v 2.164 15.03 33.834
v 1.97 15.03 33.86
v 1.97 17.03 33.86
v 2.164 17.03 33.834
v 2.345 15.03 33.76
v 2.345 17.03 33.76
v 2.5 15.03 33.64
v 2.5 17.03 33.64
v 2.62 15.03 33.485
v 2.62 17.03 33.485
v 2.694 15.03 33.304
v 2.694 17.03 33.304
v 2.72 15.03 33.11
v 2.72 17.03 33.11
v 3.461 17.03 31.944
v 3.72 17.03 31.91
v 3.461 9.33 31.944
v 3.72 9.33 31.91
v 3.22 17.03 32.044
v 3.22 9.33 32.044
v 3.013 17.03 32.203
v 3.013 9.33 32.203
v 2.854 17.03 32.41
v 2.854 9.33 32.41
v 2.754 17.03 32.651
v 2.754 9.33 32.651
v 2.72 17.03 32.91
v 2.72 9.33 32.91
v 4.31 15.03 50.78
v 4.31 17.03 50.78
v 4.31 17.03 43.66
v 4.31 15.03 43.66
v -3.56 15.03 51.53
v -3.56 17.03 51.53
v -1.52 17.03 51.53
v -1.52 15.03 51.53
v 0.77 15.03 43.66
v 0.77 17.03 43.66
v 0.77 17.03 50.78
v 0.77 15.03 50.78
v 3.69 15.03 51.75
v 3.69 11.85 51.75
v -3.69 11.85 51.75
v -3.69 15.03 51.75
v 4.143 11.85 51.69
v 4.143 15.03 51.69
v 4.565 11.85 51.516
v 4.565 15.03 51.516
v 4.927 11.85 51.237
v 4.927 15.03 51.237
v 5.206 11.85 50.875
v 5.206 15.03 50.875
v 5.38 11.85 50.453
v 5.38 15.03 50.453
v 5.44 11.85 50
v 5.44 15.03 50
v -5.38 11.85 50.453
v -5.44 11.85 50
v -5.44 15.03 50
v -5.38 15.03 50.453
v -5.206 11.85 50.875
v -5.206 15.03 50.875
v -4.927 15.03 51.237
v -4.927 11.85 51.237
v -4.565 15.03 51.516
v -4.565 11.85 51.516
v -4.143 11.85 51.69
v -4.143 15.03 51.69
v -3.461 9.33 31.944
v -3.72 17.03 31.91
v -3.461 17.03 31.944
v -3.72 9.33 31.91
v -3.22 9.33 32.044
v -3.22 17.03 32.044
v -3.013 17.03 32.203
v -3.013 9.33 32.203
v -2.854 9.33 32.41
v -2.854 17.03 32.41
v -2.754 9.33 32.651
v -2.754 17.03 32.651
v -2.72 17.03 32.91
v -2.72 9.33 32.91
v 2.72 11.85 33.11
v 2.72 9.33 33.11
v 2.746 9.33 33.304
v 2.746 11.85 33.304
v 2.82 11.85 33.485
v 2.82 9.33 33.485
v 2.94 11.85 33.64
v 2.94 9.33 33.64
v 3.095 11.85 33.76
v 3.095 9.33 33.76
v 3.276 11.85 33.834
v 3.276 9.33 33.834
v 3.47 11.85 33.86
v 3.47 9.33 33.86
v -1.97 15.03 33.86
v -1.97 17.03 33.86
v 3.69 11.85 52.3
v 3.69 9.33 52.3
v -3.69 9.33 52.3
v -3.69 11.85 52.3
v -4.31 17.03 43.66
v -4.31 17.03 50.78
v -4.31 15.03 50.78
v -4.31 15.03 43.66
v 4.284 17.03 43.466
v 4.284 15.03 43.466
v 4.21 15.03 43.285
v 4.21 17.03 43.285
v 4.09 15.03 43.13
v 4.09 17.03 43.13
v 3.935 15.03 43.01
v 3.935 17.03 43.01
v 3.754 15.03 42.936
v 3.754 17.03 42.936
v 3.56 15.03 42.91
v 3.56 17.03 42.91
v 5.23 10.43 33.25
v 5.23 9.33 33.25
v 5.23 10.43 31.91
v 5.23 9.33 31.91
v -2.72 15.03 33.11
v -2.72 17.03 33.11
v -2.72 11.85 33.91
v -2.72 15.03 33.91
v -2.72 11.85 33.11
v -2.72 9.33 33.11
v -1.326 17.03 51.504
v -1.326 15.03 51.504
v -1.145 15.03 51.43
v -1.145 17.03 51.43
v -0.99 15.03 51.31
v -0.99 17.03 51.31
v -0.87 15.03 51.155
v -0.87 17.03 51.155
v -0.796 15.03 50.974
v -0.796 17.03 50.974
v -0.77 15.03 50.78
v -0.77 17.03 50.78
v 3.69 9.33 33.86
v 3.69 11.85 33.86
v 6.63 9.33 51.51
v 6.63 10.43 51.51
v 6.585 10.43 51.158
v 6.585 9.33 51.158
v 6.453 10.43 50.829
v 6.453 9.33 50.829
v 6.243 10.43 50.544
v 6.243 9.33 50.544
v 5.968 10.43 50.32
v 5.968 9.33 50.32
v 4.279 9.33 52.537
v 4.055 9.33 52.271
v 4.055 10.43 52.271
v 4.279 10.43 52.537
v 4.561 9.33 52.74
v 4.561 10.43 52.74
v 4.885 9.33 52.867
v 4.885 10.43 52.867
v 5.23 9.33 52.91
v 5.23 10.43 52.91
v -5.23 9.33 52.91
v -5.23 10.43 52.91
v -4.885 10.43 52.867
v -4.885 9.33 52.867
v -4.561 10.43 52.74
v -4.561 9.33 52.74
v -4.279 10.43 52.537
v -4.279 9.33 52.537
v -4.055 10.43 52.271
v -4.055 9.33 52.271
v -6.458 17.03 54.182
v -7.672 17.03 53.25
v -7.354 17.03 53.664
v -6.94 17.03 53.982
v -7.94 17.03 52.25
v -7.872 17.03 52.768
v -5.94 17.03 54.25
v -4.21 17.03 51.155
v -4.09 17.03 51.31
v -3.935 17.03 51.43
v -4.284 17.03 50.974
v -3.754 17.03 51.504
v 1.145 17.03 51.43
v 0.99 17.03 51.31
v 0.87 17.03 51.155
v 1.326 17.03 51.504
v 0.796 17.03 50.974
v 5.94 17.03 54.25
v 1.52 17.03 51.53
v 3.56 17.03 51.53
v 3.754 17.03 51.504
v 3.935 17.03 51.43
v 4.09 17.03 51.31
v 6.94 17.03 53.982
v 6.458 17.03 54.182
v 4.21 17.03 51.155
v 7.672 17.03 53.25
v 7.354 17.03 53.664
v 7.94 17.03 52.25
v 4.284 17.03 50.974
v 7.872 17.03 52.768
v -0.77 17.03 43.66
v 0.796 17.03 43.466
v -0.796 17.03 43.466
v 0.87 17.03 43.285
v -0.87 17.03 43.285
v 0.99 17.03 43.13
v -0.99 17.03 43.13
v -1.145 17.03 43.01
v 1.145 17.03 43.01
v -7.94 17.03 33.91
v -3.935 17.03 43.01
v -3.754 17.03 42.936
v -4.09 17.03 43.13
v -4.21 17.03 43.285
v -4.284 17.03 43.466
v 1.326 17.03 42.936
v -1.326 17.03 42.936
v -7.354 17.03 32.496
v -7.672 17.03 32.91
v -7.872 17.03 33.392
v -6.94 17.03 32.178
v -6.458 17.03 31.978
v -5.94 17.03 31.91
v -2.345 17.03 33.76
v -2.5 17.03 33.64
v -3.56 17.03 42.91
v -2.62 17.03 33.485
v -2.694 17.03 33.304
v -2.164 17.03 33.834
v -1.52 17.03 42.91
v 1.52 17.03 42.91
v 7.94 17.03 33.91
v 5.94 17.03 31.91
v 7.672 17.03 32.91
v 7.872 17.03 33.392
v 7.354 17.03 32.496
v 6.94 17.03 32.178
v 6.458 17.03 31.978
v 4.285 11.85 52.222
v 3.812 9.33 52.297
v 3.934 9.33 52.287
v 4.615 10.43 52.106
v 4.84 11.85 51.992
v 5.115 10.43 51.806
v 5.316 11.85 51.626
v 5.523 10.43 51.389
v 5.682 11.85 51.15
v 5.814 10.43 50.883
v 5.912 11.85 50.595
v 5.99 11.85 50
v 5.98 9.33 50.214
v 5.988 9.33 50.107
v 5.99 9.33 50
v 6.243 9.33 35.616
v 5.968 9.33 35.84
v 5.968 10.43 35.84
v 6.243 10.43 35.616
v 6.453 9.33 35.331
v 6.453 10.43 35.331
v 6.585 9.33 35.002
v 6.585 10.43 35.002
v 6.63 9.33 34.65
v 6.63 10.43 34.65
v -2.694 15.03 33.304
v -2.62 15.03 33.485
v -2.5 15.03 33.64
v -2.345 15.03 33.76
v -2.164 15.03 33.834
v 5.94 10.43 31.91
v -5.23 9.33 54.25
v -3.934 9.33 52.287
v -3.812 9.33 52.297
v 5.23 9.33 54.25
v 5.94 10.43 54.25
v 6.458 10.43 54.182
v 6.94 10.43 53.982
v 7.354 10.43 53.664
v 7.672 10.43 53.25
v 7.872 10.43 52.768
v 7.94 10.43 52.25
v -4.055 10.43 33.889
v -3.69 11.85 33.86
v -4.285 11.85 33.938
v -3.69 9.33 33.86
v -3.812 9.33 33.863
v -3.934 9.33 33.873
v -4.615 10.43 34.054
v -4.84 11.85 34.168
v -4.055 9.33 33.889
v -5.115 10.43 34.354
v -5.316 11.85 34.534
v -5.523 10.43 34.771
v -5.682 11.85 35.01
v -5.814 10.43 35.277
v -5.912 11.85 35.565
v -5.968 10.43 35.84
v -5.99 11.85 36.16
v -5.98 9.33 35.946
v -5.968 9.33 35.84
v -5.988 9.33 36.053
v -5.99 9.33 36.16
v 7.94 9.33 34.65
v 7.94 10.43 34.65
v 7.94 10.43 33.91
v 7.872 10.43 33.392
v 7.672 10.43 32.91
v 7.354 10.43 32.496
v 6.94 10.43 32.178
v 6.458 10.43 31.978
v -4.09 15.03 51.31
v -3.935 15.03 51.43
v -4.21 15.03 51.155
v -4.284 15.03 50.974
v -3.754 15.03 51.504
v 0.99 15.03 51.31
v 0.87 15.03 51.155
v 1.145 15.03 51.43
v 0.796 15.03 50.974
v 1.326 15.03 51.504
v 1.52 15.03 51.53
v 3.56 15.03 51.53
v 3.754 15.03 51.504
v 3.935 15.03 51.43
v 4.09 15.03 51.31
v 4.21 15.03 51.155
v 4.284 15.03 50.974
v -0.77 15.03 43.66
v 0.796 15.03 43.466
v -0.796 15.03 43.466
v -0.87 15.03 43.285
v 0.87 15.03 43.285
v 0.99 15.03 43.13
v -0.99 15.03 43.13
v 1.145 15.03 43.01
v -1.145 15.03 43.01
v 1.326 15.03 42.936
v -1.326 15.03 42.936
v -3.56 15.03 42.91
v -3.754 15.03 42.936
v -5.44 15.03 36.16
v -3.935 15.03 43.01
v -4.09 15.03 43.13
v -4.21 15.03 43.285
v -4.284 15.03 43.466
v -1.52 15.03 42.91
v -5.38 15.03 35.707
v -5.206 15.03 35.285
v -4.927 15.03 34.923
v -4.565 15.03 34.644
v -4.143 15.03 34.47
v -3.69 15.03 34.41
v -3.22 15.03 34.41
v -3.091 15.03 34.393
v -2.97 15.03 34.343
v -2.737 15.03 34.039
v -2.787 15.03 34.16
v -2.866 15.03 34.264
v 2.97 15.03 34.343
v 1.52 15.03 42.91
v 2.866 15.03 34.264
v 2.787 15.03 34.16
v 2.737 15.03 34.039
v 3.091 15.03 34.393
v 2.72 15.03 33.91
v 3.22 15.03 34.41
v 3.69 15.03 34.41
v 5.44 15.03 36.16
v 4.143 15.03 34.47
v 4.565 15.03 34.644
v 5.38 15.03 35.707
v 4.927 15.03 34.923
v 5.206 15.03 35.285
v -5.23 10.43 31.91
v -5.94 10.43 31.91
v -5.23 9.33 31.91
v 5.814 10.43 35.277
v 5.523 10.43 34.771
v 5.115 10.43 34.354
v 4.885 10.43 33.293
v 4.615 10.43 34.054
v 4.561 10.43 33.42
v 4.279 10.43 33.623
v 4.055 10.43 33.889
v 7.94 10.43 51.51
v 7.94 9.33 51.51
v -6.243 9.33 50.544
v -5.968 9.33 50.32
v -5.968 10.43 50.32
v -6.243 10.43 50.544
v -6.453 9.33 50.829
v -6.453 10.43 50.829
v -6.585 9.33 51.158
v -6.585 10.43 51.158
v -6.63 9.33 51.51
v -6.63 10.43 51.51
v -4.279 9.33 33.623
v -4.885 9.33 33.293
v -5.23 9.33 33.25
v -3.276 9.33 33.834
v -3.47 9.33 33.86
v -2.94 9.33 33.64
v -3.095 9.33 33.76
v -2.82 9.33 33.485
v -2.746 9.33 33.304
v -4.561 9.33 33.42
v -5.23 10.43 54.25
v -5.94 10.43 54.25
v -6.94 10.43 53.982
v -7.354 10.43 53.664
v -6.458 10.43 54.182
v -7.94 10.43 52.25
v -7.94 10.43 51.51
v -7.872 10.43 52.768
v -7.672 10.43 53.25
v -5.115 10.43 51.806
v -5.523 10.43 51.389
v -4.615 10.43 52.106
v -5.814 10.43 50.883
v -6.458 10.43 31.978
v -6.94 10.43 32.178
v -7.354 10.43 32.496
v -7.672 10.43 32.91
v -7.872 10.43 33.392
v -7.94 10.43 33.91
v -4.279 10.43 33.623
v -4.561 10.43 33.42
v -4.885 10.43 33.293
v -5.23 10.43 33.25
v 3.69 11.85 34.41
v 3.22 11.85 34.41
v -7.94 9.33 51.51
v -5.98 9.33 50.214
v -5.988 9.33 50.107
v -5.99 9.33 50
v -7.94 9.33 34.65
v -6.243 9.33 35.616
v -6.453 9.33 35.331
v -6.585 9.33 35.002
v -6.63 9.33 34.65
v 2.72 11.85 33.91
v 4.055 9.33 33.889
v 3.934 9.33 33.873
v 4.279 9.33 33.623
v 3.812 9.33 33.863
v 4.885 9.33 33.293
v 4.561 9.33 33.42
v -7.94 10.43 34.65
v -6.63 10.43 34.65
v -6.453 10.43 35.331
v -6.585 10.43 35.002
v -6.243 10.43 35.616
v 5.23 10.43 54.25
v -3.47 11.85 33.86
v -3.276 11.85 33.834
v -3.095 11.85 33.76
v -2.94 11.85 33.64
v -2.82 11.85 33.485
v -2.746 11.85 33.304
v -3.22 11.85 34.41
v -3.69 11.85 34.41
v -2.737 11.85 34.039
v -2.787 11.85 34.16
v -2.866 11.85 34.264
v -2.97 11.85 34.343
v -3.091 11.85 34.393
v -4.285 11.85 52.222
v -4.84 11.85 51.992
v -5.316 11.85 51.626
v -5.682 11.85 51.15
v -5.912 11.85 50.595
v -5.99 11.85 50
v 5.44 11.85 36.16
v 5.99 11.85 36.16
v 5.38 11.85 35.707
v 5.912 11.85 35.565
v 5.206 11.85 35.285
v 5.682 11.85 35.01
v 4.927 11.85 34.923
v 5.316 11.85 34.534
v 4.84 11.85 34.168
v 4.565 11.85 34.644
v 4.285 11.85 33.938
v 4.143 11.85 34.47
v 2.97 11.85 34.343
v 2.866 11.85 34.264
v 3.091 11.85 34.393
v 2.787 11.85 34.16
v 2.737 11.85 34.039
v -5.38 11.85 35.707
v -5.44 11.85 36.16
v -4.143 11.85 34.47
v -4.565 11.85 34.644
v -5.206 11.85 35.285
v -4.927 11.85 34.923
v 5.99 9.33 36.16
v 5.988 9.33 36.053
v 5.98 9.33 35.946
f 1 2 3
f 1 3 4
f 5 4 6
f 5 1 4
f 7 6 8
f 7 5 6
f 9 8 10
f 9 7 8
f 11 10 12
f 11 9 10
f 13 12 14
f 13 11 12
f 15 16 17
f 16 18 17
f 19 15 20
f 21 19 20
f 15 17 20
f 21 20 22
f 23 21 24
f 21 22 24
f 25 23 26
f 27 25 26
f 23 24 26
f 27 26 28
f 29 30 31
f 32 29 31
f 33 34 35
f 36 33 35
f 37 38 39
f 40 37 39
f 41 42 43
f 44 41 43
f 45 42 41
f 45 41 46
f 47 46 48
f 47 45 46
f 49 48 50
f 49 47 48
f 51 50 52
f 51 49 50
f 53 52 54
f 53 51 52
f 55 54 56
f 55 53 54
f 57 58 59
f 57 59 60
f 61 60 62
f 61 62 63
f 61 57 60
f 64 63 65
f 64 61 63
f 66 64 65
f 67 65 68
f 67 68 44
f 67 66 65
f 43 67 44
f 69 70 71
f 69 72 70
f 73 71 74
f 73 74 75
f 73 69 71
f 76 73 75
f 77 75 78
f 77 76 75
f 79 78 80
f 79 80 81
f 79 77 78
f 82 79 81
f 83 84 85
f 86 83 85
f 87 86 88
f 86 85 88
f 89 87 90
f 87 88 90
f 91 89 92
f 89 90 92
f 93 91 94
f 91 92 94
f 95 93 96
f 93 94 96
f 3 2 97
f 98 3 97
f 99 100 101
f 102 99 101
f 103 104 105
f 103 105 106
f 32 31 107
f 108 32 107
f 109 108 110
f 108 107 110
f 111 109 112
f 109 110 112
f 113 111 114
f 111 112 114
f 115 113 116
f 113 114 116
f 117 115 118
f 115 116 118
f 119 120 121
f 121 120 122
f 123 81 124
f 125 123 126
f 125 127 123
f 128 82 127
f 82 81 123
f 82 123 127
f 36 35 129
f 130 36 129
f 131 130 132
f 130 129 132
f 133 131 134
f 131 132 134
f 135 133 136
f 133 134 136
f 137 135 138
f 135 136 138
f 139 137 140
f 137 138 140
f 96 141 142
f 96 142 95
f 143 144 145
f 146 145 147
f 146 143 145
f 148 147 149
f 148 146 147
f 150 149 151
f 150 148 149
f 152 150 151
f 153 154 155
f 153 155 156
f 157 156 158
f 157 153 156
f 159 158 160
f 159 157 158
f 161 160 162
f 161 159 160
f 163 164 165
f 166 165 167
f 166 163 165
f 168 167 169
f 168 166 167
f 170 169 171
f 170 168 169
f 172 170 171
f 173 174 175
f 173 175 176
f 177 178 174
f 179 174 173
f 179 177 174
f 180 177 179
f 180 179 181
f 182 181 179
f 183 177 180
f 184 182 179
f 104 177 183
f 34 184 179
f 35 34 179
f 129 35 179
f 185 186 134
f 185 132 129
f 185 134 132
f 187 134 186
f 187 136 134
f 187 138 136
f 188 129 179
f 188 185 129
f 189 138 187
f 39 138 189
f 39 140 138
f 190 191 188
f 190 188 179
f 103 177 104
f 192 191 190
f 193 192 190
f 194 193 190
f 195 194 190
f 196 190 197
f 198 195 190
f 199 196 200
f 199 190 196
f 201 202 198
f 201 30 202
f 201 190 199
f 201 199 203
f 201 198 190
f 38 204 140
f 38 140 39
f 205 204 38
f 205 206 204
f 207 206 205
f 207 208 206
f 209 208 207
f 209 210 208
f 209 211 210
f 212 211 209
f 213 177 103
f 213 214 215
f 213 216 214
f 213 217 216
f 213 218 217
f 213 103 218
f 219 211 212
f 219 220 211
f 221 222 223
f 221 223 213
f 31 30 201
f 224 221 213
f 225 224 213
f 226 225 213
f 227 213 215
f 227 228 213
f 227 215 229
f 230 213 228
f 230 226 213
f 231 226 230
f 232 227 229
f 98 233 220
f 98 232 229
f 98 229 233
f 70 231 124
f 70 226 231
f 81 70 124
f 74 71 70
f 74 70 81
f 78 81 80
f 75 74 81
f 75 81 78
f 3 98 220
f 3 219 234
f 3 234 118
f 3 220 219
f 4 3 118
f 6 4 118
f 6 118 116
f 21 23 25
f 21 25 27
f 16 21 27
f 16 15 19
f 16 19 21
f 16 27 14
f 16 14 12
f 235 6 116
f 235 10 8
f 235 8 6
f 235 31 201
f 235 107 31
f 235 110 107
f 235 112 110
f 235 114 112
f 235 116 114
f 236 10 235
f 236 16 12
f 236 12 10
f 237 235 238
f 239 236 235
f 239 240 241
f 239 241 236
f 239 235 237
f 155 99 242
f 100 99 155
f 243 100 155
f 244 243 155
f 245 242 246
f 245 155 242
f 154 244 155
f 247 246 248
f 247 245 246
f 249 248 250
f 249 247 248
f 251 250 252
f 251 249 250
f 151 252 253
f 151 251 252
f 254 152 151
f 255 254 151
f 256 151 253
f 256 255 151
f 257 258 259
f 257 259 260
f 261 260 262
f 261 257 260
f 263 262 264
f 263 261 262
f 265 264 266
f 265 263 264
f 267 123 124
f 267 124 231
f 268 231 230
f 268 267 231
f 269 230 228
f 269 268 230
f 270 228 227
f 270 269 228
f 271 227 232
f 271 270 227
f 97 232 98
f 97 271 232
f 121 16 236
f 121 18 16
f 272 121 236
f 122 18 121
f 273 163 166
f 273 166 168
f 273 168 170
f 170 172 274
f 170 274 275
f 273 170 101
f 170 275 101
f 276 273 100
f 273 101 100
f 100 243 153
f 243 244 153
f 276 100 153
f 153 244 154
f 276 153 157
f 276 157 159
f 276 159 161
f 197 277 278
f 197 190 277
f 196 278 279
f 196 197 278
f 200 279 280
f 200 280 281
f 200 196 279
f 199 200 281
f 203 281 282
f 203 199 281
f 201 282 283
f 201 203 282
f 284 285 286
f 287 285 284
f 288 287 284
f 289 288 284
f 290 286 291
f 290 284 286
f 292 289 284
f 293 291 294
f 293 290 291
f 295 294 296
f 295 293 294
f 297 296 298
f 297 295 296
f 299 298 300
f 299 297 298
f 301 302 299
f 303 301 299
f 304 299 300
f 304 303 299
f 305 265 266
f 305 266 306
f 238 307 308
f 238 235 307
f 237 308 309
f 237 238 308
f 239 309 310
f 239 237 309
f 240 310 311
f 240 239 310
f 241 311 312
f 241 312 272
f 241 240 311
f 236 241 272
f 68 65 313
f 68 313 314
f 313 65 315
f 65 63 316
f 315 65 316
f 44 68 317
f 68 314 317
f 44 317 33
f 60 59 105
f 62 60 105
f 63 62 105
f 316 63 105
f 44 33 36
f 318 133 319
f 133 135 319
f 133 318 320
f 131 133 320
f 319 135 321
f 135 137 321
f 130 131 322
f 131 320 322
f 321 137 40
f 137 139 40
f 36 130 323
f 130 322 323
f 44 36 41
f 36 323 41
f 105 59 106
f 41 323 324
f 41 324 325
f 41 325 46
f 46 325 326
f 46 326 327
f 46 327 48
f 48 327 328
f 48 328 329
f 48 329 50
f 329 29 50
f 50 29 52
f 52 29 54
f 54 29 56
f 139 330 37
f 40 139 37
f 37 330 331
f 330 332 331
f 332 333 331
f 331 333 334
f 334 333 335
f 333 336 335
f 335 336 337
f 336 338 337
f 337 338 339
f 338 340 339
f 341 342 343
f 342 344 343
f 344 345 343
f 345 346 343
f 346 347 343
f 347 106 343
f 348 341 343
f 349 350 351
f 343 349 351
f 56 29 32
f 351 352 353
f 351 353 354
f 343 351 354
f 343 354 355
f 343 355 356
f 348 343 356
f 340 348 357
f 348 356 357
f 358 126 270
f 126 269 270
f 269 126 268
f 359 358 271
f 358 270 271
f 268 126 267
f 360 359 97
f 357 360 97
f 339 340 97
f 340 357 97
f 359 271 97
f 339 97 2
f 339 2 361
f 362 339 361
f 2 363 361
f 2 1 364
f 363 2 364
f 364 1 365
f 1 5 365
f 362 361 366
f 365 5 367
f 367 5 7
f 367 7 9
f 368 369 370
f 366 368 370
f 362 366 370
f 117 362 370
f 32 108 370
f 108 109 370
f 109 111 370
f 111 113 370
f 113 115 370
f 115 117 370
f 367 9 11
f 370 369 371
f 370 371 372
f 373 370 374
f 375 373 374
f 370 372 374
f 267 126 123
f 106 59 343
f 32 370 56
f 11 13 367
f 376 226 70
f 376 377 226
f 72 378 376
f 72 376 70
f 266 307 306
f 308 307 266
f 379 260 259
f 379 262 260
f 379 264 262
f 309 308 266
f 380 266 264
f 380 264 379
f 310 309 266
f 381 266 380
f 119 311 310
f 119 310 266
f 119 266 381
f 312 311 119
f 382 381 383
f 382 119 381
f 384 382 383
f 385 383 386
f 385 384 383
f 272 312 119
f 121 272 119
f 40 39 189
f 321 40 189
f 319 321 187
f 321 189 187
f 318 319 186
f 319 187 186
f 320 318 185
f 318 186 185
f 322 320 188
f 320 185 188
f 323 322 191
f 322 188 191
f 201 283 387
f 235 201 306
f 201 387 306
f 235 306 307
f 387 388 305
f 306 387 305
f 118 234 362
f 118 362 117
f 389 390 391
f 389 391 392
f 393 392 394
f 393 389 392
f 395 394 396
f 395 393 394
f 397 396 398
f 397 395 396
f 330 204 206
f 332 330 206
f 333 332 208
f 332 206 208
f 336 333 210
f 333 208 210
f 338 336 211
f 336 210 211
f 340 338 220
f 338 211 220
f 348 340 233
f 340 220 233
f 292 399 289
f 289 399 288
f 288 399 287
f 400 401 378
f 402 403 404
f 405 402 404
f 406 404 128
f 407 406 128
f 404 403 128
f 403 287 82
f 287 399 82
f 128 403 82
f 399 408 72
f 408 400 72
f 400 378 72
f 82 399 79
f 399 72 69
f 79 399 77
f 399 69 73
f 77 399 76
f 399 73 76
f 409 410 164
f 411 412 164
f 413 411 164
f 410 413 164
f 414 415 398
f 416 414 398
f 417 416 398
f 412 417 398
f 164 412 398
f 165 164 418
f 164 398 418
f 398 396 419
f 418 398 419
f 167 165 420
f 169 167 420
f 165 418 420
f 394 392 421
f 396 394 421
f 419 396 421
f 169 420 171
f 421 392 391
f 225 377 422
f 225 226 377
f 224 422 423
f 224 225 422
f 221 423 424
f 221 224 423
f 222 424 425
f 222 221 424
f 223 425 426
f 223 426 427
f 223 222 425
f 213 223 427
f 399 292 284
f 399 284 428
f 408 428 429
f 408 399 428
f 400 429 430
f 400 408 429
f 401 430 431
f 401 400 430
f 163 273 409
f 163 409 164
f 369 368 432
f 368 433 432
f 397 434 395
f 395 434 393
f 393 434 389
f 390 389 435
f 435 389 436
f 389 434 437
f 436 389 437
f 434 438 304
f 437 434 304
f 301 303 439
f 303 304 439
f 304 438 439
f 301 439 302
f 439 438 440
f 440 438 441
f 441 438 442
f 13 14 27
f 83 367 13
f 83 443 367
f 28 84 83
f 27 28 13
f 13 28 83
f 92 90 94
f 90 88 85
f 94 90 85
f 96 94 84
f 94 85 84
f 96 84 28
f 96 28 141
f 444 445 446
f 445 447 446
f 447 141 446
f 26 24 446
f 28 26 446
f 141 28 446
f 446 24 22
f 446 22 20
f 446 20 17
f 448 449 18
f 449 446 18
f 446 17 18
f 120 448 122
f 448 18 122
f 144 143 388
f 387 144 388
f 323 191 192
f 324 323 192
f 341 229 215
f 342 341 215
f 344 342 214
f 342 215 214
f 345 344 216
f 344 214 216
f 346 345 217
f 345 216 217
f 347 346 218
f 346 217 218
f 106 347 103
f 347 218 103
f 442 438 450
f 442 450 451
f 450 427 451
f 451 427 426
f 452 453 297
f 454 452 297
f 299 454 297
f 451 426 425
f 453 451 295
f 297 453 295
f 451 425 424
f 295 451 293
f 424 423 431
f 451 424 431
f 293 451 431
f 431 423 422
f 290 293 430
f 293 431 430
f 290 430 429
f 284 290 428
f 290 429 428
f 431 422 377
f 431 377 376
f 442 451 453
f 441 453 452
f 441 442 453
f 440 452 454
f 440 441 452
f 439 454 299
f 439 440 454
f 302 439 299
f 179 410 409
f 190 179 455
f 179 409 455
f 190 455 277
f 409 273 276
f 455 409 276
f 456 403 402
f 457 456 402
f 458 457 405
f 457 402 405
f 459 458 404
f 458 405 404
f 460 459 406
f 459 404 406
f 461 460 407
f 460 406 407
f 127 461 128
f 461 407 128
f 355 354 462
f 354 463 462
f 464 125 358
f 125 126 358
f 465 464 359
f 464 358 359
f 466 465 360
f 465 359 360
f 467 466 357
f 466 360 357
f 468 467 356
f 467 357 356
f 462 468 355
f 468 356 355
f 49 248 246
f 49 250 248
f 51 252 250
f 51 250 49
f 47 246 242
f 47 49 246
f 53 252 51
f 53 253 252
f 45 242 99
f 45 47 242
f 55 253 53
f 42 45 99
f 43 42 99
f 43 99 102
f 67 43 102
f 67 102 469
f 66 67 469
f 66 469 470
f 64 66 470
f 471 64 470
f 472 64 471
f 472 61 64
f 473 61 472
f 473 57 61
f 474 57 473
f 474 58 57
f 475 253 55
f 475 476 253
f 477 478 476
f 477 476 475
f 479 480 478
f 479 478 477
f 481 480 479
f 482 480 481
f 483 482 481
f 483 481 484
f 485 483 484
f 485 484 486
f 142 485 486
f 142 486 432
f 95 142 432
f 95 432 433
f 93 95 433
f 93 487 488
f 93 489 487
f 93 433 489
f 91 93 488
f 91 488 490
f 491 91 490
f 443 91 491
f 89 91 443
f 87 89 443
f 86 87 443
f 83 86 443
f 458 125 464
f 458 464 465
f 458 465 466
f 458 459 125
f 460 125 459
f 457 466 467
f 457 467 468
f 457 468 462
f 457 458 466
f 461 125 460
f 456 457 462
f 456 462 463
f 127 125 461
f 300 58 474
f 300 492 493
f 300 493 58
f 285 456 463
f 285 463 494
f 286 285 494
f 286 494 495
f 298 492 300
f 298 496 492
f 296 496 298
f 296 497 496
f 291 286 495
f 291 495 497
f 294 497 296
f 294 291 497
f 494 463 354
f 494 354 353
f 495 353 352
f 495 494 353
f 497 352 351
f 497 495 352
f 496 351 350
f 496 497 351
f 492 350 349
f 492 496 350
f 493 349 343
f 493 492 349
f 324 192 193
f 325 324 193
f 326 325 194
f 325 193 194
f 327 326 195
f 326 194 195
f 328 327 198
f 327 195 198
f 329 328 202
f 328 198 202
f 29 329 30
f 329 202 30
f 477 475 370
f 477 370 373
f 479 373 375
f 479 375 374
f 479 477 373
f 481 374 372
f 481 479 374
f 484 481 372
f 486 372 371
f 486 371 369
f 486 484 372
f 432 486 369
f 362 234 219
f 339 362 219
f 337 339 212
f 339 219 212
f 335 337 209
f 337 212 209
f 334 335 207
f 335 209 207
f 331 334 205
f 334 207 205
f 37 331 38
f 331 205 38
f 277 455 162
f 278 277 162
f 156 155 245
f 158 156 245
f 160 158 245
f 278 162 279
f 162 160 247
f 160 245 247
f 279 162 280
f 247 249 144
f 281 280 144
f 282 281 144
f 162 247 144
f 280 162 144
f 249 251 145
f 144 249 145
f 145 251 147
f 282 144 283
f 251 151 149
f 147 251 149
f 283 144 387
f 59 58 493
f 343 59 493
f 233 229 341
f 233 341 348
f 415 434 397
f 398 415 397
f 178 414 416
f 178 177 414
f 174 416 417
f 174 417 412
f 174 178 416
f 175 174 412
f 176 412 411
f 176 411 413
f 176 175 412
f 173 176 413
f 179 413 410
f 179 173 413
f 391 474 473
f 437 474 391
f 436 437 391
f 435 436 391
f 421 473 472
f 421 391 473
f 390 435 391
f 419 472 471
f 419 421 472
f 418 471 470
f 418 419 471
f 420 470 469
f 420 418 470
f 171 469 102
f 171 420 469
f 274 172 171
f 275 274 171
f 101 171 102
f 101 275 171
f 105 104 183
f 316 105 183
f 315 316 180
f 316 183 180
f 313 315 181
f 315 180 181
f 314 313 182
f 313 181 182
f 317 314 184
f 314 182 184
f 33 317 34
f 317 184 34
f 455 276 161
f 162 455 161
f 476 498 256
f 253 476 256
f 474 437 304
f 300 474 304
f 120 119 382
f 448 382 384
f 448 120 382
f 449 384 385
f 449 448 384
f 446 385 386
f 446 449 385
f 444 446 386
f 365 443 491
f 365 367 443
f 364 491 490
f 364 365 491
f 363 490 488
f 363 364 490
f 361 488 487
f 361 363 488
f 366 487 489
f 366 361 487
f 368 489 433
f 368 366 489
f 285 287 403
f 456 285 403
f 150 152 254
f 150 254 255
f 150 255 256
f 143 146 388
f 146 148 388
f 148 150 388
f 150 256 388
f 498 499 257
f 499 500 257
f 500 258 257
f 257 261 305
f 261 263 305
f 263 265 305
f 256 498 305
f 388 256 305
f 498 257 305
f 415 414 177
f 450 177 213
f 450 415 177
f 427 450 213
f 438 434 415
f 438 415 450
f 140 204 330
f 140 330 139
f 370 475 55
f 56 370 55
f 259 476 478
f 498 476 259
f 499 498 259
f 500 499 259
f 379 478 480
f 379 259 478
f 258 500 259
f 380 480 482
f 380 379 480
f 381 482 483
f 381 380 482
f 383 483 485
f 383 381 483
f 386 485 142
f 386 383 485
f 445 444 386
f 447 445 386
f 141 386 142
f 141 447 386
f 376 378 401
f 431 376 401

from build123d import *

# Parameters (mm, degrees)
SKETCH003_W             = 15.88
SKETCH003_H             = 22.34
PAD001_DEPTH            = 7.7
POCKET002_DEPTH         = 5.7
POCKET003_DEPTH         = 2.52
SKETCH007_W             = 5.44
SKETCH007_H             = 2.67
POCKET004_DEPTH         = 5.7
POCKET005_DEPTH         = 7.701
POCKET006_DEPTH         = 2
POCKET007_DEPTH         = 1.1
FILLET_R                = 1
FILLET001_R             = 2
FILLET011_R             = 0.5
BODY001_PLACEMENT_ANGLE = 270


with BuildPart() as part:
    # Sketch003 (on XY_Plane013 of Origin026) → Pad001 (new body)
    with BuildSketch(Plane.XY):
        Rectangle(SKETCH003_W, SKETCH003_H)
    extrude(amount=PAD001_DEPTH)

    # Sketch004 (on XY_Plane013 of Origin026) → Pocket002 (cut)
    with BuildSketch(Plane.XY):
        with BuildLine():
            Line((-3.69, 8.67), (3.69, 8.67))
            ThreePointArc((5.44, 6.92), (4.927437, 8.157437), (3.69, 8.67))
            Line((5.44, 6.92), (5.44, -6.92))
            ThreePointArc((3.69, -8.67), (4.927437, -8.157437), (5.44, -6.92))
            Line((3.69, -8.67), (-3.69, -8.67))
            ThreePointArc((-5.44, -6.92), (-4.927437, -8.157437), (-3.69, -8.67))
            Line((-5.44, -6.92), (-5.44, 6.92))
            ThreePointArc((-3.69, 8.67), (-4.927437, 8.157437), (-5.44, 6.92))
        make_face()
    extrude(amount=POCKET002_DEPTH, mode=Mode.SUBTRACT)

    # Sketch006 (on XY_Plane013 of Origin026) → Pocket003 (cut)
    with BuildSketch(Plane.XY):
        with BuildLine():
            Line((5.99, 6.92), (5.99, -6.92))
            ThreePointArc((3.69, -9.22), (5.316346, -8.546346), (5.99, -6.92))
            Line((3.69, -9.22), (-3.69, -9.22))
            ThreePointArc((-5.99, -6.92), (-5.316346, -8.546346), (-3.69, -9.22))
            Line((-5.99, -6.92), (-5.99, 6.92))
            ThreePointArc((-3.69, 9.22), (-5.316346, 8.546346), (-5.99, 6.92))
            Line((-3.69, 9.22), (-3.47, 9.22))
            ThreePointArc((-3.47, 9.22), (-2.93967, 9.43967), (-2.72, 9.97))
            Line((-2.72, 11.17), (-2.72, 9.97))
            Line((2.72, 11.17), (-2.72, 11.17))
            Line((2.72, 11.17), (2.72, 9.97))
            ThreePointArc((2.72, 9.97), (2.93967, 9.43967), (3.47, 9.22))
            Line((3.69, 9.22), (3.47, 9.22))
            ThreePointArc((5.99, 6.92), (5.316346, 8.546346), (3.69, 9.22))
        make_face()
    extrude(amount=POCKET003_DEPTH, mode=Mode.SUBTRACT)

    # Sketch007 (on XY_Plane013 of Origin026) → Pocket004 (cut)
    with BuildSketch(Plane.XY):
        with Locations((0, 9.835)):
            Rectangle(SKETCH007_W, SKETCH007_H)
    extrude(amount=POCKET004_DEPTH, mode=Mode.SUBTRACT)

    # Sketch008 (on XY_Plane013 of Origin026) → Pocket005 (cut, through all)
    with BuildSketch(Plane.XY):
        with BuildLine():
            Line((2.72, 11.17), (2.72, 9.97))
            ThreePointArc((1.97, 9.22), (2.50033, 9.43967), (2.72, 9.97))
            Line((1.97, 9.22), (-1.97, 9.22))
            ThreePointArc((-2.72, 9.97), (-2.50033, 9.43967), (-1.97, 9.22))
            Line((-2.72, 11.17), (-2.72, 9.97))
            Line((2.72, 11.17), (-2.72, 11.17))
        make_face()
    extrude(amount=POCKET005_DEPTH, mode=Mode.SUBTRACT)

    # Sketch009 (on XY_Plane013 of Origin026) → Pocket006 (cut)
    with BuildSketch(Plane.XY.offset(7.7)):
        with BuildLine():
            Line((-0.77, -0.58), (-0.77, -7.7))
            ThreePointArc((-1.52, -8.45), (-0.98967, -8.23033), (-0.77, -7.7))
            Line((-3.56, -8.45), (-1.52, -8.45))
            ThreePointArc((-4.31, -7.7), (-4.09033, -8.23033), (-3.56, -8.45))
            Line((-4.31, -7.7), (-4.31, -0.58))
            ThreePointArc((-3.56, 0.17), (-4.09033, -0.04967), (-4.31, -0.58))
            Line((-3.56, 0.17), (-1.52, 0.17))
            ThreePointArc((-0.77, -0.58), (-0.98967, -0.04967), (-1.52, 0.17))
        make_face()
        with BuildLine():
            Line((0.77, -0.58), (0.77, -7.7))
            ThreePointArc((0.77, -7.7), (0.98967, -8.23033), (1.52, -8.45))
            Line((1.52, -8.45), (3.56, -8.45))
            ThreePointArc((3.56, -8.45), (4.09033, -8.23033), (4.31, -7.7))
            Line((4.31, -7.7), (4.31, -0.58))
            ThreePointArc((4.31, -0.58), (4.09033, -0.04967), (3.56, 0.17))
            Line((1.52, 0.17), (3.56, 0.17))
            ThreePointArc((1.52, 0.17), (0.98967, -0.04967), (0.77, -0.58))
        make_face()
    extrude(amount=-POCKET006_DEPTH, mode=Mode.SUBTRACT)

    # Sketch010 (on XY_Plane013 of Origin026) → Pocket007 (cut)
    with BuildSketch(Plane.XY):
        with BuildLine():
            Line((5.23, 13.43), (10.23, 13.43))
            Line((10.23, 13.43), (10.23, 8.43))
            Line((6.63, 8.43), (10.23, 8.43))
            ThreePointArc((5.23, 9.83), (4.240051, 7.440051), (6.63, 8.43))
            Line((5.23, 9.83), (5.23, 13.43))
        make_face()
        with BuildLine():
            Line((-5.23, 13.43), (-10.23, 13.43))
            Line((-10.23, 13.43), (-10.23, 8.43))
            Line((-10.23, 8.43), (-6.63, 8.43))
            ThreePointArc((-6.63, 8.43), (-4.240051, 7.440051), (-5.23, 9.83))
            Line((-5.23, 13.43), (-5.23, 9.83))
        make_face()
        with BuildLine():
            Line((5.23, -13.43), (10.23, -13.43))
            Line((10.23, -13.43), (10.23, -8.43))
            Line((6.63, -8.43), (10.23, -8.43))
            ThreePointArc((6.63, -8.43), (4.240051, -7.440051), (5.23, -9.83))
            Line((5.23, -13.43), (5.23, -9.83))
        make_face()
        with BuildLine():
            Line((-10.23, -13.43), (-5.23, -13.43))
            Line((-5.23, -13.43), (-5.23, -9.83))
            ThreePointArc((-5.23, -9.83), (-4.240051, -7.440051), (-6.63, -8.43))
            Line((-10.23, -8.43), (-6.63, -8.43))
            Line((-10.23, -13.43), (-10.23, -8.43))
        make_face()
    extrude(amount=POCKET007_DEPTH, mode=Mode.SUBTRACT)

    # Fillet
    fillet_edges = [part.edges().sort_by_distance(p)[0] for p in [
        (2.72, 11.17, 3.85),
        (-2.72, 11.17, 3.85),
    ]]
    fillet(fillet_edges, radius=FILLET_R)

    # Fillet001
    fillet001_edges = [part.edges().sort_by_distance(p)[0] for p in [
        (7.94, 11.17, 4.4),
        (-7.94, 11.17, 4.4),
        (-7.94, -11.17, 4.4),
        (7.94, -11.17, 4.4),
    ]]
    fillet(fillet001_edges, radius=FILLET001_R)

    # Fillet011
    fillet011_edges = [part.edges().sort_by_distance(p)[0] for p in [
        (2.72, 8.67, 4.11),
        (-2.72, 8.67, 4.11),
    ]]
    fillet(fillet011_edges, radius=FILLET011_R)


with BuildPart() as part_1:
    # Body001 placement: moved
    add(part.part.moved(Location((0, 9.33, 43.08))).rotate(Axis((0, 9.33, 43.08), (1, 0, 0)), BODY001_PLACEMENT_ANGLE))


solid = part_1.part
